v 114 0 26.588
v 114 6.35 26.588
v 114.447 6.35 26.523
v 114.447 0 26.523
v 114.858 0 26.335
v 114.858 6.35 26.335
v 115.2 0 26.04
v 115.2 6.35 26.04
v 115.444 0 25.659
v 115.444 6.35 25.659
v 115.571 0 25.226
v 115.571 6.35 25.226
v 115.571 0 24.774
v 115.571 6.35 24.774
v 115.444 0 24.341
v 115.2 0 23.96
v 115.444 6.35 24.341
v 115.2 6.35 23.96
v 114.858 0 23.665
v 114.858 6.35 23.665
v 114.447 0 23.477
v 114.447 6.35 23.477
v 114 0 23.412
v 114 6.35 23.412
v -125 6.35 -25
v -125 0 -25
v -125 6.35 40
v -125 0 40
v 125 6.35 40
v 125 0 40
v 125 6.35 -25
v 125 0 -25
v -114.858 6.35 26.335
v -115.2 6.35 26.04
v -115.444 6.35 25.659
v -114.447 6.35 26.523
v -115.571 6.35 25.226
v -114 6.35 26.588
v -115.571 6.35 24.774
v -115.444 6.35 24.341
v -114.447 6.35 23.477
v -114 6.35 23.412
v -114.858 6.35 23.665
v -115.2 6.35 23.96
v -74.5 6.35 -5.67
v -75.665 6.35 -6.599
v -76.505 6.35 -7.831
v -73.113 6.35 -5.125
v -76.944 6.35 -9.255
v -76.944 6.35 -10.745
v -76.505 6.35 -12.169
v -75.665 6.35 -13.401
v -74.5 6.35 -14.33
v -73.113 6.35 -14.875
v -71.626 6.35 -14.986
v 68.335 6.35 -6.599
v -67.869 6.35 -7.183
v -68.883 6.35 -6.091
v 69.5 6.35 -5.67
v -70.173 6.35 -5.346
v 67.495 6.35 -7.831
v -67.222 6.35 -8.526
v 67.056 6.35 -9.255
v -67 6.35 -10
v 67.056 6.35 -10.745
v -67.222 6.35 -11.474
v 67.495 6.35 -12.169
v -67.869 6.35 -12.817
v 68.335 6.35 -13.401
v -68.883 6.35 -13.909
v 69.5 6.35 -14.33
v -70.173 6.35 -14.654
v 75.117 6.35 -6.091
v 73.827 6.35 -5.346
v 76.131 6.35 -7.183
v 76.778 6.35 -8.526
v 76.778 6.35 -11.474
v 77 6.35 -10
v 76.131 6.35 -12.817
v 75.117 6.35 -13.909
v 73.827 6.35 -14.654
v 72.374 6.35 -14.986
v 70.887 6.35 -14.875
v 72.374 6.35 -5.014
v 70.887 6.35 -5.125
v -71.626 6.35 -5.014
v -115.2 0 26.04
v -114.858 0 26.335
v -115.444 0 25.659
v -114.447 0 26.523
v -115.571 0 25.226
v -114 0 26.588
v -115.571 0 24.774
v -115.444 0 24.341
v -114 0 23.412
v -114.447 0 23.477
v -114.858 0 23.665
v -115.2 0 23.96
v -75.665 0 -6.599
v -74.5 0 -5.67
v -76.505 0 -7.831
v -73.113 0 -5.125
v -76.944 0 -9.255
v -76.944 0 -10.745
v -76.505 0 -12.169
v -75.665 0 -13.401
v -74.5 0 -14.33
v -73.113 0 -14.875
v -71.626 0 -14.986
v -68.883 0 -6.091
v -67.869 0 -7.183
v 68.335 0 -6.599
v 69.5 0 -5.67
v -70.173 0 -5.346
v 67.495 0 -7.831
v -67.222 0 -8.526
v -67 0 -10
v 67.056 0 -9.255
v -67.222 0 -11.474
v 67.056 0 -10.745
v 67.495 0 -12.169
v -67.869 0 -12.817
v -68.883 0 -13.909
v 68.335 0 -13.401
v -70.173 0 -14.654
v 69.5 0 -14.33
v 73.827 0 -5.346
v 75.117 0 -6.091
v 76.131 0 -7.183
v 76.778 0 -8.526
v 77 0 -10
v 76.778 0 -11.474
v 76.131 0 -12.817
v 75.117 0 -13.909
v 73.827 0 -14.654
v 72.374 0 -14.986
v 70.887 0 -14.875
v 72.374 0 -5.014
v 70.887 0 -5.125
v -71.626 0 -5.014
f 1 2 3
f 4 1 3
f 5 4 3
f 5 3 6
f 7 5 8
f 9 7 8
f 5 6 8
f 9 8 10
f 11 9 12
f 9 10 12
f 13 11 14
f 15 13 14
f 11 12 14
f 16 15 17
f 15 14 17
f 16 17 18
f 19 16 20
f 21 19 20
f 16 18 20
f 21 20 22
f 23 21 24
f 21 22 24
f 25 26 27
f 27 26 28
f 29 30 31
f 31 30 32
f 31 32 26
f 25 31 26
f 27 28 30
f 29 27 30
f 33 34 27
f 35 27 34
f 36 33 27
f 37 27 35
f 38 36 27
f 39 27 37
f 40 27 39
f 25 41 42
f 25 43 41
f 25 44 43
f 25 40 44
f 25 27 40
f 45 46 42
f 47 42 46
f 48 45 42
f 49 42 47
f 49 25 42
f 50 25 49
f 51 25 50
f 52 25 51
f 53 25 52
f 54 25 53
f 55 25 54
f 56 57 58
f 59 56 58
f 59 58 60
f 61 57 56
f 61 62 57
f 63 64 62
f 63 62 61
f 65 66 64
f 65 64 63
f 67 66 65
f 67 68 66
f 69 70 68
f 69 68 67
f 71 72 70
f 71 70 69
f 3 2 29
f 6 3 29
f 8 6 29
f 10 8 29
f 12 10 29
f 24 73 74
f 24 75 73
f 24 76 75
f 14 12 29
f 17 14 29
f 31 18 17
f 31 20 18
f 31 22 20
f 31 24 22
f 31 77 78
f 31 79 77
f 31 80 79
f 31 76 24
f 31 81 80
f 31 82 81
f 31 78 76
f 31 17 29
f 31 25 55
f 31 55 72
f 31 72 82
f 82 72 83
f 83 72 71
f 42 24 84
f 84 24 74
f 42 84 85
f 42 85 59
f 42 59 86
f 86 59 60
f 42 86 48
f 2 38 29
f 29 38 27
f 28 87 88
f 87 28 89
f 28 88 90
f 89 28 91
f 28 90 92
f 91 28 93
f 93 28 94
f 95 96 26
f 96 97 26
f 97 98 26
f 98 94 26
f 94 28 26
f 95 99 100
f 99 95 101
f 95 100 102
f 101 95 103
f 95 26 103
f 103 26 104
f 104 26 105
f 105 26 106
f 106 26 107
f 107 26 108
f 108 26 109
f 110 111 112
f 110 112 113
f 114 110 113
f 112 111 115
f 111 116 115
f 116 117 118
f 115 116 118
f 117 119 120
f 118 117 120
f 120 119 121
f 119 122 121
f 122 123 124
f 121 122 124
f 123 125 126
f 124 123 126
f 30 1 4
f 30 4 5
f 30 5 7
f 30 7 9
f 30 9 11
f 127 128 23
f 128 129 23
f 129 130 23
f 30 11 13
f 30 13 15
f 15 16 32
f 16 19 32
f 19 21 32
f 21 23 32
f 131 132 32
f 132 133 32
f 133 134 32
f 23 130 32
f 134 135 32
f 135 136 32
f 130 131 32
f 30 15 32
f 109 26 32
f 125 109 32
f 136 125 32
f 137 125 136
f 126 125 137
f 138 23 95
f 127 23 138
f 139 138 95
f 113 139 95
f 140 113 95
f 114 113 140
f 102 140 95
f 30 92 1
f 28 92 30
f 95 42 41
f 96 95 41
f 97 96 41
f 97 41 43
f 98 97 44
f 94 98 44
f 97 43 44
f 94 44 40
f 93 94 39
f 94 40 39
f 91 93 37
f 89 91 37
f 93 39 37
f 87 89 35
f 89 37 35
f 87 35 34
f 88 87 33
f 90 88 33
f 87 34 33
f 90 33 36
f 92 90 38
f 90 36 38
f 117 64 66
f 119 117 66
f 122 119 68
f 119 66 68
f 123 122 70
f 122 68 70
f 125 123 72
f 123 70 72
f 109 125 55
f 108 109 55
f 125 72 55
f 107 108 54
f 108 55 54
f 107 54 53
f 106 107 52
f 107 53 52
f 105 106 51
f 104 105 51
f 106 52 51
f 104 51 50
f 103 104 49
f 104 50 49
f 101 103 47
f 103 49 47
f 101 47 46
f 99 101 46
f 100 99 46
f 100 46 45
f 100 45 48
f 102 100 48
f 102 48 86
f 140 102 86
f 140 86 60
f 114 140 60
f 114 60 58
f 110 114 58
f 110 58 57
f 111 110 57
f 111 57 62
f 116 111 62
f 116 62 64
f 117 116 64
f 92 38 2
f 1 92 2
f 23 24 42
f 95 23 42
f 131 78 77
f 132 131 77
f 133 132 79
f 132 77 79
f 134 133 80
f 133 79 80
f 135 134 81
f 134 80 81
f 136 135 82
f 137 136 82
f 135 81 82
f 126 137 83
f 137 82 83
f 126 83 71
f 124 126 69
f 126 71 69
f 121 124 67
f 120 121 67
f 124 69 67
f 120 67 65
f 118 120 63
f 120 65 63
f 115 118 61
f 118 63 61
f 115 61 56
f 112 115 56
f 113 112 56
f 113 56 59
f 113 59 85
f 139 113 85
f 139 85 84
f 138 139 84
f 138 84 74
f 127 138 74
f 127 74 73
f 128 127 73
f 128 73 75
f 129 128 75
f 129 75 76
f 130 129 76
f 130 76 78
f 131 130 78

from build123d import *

# Parameters (mm, degrees)
SALIENTE_EXTRUIR1_DEPTH = 6.35
CROQUIS2_R              = 5
CORTAR_EXTRUIR3_DEPTH   = 7.35


with BuildPart() as part:
    # Croquis1 → Saliente-Extruir1 (new body)
    with BuildSketch(Plane(origin=(0, 0, 0), x_dir=(1, 0, 0), z_dir=(0, 1, 0))):
        Polygon((-125, -25), (-125, -40), (125, -40), (125, -25), (125, 25), (-125, 25), align=None)
    extrude(amount=SALIENTE_EXTRUIR1_DEPTH)

    # Croquis2 → Cortar-Extruir3 (cut, through all)
    with BuildSketch(Plane(origin=(0, 6.35, 0), x_dir=(1, 0, 0), z_dir=(0, 1, 0))):
        with Locations((-72, 10)):
            Circle(CROQUIS2_R)
        with Locations((72, 10)):
            Circle(CROQUIS2_R)
        with BuildLine():
            Line((114, -23.4125), (-114, -23.4125))
            ThreePointArc((-114, -23.4125), (-115.5875, -25), (-114, -26.5875))
            Line((-114, -26.5875), (114, -26.5875))
            ThreePointArc((114, -26.5875), (115.5875, -25), (114, -23.4125))
        make_face()
    extrude(amount=-CORTAR_EXTRUIR3_DEPTH, mode=Mode.SUBTRACT)


solid = part.part
